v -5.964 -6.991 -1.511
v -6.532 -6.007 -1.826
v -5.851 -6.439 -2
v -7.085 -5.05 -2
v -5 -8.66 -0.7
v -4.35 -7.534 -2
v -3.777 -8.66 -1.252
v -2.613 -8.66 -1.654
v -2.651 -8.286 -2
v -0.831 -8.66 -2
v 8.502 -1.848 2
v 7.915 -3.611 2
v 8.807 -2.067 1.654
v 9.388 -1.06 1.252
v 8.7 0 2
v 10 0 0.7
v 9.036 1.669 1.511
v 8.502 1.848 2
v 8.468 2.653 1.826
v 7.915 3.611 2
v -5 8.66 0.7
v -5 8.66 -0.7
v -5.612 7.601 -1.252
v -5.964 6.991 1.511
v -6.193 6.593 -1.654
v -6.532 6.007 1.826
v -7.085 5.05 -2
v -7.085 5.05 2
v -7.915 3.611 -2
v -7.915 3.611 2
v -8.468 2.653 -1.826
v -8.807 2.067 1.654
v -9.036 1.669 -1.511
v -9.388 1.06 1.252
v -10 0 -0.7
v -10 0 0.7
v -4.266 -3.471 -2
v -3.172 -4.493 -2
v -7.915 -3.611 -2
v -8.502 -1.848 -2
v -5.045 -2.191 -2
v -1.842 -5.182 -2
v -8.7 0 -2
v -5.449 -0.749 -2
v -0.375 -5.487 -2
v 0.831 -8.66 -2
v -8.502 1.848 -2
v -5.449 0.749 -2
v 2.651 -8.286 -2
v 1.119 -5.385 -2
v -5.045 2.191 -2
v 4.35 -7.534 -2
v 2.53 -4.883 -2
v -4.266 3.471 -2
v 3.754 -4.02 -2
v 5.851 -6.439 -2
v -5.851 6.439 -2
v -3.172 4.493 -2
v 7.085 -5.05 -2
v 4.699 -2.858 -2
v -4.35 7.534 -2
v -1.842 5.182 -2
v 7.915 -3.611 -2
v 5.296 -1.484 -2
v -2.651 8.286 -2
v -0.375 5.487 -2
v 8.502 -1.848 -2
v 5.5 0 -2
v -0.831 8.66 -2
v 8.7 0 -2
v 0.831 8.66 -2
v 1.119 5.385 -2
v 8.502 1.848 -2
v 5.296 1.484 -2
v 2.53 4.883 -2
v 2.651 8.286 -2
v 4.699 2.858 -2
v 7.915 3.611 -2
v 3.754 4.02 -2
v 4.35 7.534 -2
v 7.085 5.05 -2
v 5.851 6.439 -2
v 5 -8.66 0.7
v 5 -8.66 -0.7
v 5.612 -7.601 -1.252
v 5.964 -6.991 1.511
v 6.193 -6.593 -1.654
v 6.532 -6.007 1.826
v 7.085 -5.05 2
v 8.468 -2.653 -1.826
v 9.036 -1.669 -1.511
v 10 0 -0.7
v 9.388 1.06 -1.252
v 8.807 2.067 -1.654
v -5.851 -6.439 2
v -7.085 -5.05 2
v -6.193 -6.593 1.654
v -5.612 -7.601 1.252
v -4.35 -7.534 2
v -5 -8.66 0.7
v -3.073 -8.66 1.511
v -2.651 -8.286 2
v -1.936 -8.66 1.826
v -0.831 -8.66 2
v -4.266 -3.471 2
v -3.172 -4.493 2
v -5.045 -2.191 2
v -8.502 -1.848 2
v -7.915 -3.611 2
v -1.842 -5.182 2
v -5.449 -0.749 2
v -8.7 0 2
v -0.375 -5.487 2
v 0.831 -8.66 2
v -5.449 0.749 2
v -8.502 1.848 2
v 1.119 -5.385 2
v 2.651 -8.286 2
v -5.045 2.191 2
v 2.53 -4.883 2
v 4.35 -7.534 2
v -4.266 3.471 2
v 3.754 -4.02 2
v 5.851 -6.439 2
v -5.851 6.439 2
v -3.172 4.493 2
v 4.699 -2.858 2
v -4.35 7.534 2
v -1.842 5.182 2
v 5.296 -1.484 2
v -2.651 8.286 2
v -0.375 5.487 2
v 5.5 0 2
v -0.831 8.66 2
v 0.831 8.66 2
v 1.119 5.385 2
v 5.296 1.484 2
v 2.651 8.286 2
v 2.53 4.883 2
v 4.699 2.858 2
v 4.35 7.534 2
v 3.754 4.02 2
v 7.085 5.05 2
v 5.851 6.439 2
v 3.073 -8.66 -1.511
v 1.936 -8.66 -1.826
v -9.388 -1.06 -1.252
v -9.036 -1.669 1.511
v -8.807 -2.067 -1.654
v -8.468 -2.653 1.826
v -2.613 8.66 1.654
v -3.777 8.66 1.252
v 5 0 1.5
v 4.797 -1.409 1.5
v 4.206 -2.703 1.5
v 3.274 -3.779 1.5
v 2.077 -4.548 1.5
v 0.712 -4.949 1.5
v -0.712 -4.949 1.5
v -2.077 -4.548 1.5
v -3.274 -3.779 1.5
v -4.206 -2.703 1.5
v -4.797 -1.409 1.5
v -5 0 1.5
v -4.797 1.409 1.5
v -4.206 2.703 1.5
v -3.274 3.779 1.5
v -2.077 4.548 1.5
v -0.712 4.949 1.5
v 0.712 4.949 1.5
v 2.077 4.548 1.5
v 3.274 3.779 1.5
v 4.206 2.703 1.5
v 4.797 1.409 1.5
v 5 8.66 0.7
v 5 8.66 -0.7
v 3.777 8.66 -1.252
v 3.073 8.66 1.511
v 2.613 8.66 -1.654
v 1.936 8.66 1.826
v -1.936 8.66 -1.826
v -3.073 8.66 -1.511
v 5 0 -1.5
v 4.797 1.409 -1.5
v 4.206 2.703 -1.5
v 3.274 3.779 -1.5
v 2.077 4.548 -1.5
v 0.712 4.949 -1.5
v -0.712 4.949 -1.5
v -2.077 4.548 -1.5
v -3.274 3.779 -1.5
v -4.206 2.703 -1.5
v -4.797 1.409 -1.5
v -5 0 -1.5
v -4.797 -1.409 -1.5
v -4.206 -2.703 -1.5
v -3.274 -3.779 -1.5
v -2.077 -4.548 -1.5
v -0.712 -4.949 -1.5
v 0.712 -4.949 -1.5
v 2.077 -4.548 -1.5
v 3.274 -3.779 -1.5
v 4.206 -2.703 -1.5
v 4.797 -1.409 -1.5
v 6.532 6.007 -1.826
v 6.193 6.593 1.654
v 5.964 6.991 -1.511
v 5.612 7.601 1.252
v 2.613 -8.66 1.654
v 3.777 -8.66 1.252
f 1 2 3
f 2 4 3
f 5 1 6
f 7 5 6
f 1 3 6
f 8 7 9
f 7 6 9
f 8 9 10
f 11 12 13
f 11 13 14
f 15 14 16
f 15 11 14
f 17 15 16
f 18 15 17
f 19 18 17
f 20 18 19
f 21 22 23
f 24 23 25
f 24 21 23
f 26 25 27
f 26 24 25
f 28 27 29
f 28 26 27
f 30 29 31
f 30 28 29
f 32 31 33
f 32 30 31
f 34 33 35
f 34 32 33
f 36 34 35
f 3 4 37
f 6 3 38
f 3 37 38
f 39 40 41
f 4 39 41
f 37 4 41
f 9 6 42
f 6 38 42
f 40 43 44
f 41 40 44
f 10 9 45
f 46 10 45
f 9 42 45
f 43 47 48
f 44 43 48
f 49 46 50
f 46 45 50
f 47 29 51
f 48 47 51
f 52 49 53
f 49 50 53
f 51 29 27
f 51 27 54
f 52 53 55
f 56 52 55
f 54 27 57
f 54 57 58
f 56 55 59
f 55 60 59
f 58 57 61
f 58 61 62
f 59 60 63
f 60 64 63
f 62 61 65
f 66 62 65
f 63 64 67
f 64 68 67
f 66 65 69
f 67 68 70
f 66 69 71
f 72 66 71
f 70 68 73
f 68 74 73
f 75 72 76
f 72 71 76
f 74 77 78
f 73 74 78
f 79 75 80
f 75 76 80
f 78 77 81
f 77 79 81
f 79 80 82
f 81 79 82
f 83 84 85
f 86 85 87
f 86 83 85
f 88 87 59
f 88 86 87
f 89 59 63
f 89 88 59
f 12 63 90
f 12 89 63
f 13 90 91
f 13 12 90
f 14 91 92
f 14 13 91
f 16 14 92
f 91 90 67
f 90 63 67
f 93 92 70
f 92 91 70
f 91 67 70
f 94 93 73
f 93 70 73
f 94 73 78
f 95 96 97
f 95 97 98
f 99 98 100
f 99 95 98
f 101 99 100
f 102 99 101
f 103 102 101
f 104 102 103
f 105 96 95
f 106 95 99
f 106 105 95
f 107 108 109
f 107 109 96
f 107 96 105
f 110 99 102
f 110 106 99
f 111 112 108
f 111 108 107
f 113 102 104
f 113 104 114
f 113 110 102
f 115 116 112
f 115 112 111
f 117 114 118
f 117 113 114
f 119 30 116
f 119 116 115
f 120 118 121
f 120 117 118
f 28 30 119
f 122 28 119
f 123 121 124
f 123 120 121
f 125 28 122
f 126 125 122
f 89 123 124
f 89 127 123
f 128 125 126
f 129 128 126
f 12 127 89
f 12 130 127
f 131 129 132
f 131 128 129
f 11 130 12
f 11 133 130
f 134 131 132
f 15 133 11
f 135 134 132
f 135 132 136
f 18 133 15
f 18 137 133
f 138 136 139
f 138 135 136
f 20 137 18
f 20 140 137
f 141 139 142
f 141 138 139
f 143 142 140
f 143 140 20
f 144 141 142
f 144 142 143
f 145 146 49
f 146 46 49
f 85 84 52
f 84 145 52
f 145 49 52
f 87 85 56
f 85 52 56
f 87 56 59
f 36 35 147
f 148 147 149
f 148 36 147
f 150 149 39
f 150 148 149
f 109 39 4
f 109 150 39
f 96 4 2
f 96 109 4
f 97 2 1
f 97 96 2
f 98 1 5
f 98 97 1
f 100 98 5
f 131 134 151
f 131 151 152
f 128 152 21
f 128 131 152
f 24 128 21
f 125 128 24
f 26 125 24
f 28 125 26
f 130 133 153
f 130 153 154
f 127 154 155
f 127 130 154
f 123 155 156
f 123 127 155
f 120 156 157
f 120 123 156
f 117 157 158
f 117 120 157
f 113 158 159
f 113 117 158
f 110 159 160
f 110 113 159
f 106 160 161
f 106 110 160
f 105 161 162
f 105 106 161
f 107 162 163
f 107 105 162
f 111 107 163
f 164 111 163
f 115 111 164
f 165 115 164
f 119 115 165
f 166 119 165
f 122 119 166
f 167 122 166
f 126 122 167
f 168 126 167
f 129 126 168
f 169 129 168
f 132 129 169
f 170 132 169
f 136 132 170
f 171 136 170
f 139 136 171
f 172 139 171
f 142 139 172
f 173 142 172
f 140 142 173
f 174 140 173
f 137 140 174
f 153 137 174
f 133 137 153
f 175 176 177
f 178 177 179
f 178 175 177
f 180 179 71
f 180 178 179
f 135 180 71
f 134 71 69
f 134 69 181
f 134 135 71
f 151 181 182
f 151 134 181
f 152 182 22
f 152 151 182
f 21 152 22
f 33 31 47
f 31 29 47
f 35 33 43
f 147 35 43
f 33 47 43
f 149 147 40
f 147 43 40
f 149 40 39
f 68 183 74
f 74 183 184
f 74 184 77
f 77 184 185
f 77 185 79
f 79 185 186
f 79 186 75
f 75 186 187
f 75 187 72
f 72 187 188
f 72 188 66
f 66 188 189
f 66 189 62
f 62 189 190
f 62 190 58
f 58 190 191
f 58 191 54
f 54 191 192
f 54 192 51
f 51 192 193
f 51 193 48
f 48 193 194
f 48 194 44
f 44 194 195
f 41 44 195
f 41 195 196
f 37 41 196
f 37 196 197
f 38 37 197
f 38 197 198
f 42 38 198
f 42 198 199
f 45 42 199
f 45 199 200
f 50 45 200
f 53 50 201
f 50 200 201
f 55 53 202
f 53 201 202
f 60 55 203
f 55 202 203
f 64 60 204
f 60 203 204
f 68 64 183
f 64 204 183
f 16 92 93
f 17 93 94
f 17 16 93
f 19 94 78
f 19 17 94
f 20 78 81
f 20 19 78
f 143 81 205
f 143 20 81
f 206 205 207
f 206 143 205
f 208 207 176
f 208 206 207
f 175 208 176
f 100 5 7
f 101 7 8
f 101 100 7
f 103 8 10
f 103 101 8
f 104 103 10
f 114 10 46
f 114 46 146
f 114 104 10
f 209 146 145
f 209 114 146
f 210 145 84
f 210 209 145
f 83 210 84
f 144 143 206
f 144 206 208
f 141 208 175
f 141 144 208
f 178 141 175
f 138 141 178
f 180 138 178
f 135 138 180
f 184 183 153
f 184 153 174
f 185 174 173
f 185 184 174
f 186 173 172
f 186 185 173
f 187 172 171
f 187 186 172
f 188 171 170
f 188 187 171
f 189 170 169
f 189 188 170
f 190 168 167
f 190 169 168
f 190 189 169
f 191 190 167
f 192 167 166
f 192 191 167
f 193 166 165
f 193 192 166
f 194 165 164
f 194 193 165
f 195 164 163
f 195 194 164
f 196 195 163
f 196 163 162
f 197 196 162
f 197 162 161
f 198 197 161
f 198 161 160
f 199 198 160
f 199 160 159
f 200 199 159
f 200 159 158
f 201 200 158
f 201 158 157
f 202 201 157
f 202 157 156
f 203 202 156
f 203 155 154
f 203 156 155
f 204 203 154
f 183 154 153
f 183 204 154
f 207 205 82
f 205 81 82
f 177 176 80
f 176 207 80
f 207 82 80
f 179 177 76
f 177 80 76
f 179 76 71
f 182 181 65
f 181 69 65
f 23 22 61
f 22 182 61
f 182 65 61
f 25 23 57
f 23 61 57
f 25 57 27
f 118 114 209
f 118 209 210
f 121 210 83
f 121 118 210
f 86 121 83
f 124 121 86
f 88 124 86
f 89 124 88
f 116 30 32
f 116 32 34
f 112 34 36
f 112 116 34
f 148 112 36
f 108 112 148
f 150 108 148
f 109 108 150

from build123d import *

# Parameters (mm, degrees)
BOSS_EXTRUDE1_DEPTH = 2
SKETCH2_R           = 5
CUT_EXTRUDE1_DEPTH  = 14.820274961
CHAMFER1_SIZE       = 0.5


with BuildPart() as part:
    # Sketch1 → Boss-Extrude1 (new, symmetric)
    with BuildSketch(Plane.XY):
        Polygon((-10, 0), (-5, -8.660254038), (5, -8.660254038), (10, 0), (5, 8.660254038), (-5, 8.660254038), align=None)
    extrude(amount=BOSS_EXTRUDE1_DEPTH, both=True)

    # Sketch2 → Cut-Extrude1 (cut, through all)
    with BuildSketch(Plane.XY.offset(-2)):
        Circle(SKETCH2_R)
    extrude(amount=CUT_EXTRUDE1_DEPTH, mode=Mode.SUBTRACT)

    # Sketch8 → Cut-Revolve1 (revolve, cut)
    with BuildSketch(Plane(origin=(0, 0, 0), x_dir=(1, 0, 0), z_dir=(0, 1, 0))):
        Polygon((-8.6, -2.1), (-10.1, -2.1), (-10.1, -0.6), align=None)
    cut_revolve1 = revolve(axis=Axis((0, 0, -7.705), (0, 0, 1)), mode=Mode.SUBTRACT)

    # Mirror1: Cut-Revolve1 across plane
    add(cut_revolve1.mirror(Plane.XY), mode=Mode.SUBTRACT)

    # Chamfer1
    chamfer1_edges = [part.edges().sort_by_distance(p)[0] for p in [
        (-5, 0, -2),
        (-5, 0, 2),
    ]]
    chamfer(chamfer1_edges, length=CHAMFER1_SIZE)


solid = part.part
